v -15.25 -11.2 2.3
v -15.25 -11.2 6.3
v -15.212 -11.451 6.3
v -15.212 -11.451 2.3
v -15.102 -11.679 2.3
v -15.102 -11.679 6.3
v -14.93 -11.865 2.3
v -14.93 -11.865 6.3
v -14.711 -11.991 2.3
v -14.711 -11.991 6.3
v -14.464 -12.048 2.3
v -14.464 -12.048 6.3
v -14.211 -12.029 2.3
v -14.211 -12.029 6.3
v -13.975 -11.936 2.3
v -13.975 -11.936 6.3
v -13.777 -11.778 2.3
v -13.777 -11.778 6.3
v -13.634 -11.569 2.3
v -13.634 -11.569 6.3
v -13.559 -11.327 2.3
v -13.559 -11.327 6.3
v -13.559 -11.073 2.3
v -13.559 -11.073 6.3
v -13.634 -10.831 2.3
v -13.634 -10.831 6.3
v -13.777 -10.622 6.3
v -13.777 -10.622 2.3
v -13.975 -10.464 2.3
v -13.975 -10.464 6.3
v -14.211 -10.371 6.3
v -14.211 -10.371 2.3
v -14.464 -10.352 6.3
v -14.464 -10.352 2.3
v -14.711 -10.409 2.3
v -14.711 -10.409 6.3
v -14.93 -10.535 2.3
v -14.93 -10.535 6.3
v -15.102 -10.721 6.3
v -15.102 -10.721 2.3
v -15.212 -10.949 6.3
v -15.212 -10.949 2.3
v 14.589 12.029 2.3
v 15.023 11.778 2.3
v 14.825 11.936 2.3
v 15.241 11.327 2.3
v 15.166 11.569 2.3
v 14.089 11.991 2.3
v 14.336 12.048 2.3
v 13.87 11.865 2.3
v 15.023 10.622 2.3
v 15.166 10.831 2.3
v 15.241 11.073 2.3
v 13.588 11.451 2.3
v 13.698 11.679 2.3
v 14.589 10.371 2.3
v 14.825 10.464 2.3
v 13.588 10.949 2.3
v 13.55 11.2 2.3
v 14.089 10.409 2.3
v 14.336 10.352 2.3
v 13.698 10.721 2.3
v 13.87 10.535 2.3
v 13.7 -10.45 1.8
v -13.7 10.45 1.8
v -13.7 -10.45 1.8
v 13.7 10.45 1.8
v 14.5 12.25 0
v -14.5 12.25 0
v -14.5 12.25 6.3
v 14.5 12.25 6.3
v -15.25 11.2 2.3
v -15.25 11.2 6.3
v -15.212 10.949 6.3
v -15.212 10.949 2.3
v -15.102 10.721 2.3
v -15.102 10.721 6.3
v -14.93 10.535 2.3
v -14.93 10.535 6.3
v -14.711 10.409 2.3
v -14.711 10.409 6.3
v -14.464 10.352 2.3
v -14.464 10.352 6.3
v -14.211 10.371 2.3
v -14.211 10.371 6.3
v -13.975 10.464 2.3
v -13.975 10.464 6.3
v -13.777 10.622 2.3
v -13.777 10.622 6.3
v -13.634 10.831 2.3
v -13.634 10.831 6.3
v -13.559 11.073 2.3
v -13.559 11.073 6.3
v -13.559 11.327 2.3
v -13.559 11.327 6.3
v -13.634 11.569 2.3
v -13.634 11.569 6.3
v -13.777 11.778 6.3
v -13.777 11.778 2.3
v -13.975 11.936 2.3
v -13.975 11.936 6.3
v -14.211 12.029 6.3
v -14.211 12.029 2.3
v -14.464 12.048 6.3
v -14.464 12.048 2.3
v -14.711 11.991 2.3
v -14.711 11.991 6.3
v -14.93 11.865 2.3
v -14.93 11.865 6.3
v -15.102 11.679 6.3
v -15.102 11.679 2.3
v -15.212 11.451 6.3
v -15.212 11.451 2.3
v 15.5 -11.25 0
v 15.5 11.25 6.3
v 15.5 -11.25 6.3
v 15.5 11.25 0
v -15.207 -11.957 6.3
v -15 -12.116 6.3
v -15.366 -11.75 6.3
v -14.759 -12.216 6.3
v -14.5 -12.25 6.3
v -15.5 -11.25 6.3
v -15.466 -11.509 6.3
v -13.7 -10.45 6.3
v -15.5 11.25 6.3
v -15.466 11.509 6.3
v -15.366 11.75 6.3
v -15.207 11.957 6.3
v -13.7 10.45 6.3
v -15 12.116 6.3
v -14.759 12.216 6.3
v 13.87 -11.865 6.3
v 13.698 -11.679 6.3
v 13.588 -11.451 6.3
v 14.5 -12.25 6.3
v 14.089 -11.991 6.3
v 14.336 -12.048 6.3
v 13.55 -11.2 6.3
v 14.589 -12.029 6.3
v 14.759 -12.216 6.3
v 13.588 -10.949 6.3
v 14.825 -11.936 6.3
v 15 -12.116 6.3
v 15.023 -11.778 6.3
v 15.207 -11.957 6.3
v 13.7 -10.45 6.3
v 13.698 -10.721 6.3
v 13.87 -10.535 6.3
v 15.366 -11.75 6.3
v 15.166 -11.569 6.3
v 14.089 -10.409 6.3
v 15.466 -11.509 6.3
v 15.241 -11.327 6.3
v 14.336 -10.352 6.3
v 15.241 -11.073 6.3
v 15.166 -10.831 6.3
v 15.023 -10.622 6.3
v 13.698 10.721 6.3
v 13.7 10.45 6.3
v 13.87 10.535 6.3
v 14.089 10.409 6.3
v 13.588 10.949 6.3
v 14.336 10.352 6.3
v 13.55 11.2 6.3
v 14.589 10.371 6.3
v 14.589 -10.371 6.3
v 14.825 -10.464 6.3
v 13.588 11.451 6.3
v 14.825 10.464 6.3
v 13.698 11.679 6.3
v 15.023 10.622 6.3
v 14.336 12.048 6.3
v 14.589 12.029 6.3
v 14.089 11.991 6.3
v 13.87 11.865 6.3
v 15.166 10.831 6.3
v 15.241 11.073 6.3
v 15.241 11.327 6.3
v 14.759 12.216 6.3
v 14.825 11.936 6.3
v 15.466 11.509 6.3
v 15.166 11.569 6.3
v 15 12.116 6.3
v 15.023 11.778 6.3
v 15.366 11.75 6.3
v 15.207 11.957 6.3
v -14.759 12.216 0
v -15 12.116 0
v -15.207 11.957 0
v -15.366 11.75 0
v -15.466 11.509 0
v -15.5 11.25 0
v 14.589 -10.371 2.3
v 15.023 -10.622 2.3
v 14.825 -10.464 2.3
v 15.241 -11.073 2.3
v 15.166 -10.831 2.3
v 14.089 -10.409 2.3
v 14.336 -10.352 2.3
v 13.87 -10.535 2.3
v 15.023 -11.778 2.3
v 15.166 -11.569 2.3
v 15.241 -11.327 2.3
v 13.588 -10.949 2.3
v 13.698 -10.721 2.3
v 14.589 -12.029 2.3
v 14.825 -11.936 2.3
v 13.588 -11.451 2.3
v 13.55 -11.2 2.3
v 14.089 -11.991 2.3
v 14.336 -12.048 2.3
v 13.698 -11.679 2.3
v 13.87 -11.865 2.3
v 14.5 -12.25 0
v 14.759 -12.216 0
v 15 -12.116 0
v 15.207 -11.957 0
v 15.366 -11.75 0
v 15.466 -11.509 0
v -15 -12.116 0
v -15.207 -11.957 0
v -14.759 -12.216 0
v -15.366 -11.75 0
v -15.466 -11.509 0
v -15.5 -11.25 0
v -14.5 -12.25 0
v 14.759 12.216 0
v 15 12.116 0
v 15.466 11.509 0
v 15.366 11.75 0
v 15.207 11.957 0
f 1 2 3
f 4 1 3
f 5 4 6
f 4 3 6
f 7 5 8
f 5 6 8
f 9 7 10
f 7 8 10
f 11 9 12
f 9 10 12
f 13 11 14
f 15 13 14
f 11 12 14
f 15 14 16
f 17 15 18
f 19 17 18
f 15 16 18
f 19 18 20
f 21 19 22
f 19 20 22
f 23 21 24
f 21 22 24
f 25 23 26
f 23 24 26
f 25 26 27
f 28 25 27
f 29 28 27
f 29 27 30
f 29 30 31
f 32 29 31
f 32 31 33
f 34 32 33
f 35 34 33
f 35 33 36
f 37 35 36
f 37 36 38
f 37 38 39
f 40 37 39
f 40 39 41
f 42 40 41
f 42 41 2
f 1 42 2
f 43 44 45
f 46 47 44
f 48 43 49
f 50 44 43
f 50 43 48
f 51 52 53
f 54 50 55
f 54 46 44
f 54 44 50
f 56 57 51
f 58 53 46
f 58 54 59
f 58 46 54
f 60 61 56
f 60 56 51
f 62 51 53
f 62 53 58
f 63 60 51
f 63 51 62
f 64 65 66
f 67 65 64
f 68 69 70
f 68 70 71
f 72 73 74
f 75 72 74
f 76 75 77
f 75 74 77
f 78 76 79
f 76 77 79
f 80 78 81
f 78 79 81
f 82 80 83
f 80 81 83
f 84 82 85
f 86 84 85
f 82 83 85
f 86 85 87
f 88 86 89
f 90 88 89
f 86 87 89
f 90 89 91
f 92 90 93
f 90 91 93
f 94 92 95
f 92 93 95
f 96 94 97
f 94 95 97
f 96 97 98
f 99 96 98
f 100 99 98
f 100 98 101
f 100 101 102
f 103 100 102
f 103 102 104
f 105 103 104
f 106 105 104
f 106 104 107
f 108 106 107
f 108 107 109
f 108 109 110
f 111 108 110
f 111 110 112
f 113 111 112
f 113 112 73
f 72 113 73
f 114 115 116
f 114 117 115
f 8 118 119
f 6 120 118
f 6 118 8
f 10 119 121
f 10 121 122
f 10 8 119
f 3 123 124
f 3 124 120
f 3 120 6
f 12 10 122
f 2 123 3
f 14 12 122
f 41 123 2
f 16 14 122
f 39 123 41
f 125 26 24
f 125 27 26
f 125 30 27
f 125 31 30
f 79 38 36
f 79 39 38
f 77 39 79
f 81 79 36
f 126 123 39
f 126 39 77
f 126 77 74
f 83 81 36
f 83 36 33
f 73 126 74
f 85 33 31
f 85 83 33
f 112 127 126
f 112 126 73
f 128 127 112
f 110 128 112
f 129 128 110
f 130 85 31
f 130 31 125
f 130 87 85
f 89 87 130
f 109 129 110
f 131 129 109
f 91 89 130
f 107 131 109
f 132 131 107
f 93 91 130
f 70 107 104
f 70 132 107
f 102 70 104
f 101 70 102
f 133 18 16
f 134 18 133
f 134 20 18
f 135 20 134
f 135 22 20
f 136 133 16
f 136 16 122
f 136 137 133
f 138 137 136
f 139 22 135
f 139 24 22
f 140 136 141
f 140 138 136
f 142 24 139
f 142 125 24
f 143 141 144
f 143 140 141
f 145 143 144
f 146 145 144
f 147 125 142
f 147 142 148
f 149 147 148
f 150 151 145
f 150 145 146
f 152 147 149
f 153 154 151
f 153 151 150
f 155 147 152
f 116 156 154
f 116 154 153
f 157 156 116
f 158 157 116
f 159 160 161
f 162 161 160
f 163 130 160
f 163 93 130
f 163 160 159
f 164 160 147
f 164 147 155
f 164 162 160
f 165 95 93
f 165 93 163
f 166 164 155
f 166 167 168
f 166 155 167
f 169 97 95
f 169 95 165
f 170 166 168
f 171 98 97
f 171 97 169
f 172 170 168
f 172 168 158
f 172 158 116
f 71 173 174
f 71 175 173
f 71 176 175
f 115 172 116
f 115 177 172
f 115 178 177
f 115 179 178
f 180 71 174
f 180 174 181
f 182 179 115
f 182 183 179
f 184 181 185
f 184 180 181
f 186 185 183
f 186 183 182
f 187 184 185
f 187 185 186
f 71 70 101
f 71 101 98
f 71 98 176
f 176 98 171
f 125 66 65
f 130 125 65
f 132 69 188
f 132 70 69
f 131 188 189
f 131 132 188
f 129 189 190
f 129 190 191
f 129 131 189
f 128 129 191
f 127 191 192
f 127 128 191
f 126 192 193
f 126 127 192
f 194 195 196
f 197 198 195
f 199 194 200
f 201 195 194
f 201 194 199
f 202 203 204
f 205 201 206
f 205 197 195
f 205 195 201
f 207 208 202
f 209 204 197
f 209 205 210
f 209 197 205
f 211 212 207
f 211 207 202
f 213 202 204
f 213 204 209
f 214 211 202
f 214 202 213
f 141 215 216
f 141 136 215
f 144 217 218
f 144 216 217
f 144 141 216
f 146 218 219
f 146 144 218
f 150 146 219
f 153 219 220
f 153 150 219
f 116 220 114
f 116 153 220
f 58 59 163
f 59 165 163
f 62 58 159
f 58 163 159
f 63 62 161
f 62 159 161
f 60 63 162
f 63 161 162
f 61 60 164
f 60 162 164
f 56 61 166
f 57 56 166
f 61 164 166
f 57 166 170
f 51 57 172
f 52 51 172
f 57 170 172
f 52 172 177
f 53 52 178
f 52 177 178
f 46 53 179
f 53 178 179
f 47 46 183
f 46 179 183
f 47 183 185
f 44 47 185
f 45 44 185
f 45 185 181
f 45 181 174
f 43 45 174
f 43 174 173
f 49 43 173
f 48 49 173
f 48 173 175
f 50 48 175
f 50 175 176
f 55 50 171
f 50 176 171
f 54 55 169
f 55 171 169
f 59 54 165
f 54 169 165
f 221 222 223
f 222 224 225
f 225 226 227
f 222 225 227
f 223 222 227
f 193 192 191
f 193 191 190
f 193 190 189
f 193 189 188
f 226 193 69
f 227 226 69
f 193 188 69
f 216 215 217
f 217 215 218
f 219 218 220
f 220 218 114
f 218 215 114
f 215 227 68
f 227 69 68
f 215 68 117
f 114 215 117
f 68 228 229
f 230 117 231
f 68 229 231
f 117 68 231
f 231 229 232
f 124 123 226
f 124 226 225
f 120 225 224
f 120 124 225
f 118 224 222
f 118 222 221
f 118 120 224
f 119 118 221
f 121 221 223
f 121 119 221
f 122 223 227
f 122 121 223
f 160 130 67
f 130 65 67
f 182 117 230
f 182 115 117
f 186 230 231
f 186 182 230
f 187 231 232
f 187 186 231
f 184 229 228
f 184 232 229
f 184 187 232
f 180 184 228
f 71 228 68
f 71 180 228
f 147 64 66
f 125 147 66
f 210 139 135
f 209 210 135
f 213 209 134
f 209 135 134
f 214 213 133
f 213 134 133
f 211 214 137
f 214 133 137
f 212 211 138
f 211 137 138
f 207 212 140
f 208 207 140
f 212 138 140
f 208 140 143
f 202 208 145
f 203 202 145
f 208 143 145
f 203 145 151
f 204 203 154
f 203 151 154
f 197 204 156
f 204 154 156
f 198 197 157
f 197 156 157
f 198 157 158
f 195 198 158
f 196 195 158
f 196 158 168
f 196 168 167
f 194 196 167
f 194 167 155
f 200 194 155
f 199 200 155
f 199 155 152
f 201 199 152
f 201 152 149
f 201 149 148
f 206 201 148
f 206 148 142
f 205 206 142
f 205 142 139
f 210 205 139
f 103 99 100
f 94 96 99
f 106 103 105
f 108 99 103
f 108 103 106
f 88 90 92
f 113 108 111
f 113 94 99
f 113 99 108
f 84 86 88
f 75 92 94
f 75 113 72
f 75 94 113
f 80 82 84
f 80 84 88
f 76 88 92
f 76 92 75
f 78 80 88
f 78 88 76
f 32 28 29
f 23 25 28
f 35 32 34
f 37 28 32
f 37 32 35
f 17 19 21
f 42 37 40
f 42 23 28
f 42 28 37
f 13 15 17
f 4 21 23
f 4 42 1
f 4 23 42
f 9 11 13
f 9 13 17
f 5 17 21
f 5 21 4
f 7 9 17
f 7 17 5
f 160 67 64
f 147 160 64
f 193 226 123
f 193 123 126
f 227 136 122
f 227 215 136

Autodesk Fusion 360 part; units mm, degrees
sketch "Sketch1" plane through (0, 0, 0) normal (0, 0, 1) x (1, 0, 0) in component "part 1"
  line L0 (-15.5, 12.25) -> (15.5, 12.25)
  line L1 (15.5, 12.25) -> (15.5, -12.25)
  line L2 (15.5, -12.25) -> (-15.5, -12.25)
  line L3 (-15.5, -12.25) -> (-15.5, 12.25)
  line L4 (-15.5, 12.25) -> (15.5, -12.25) construction
  line L5 (15.5, 12.25) -> (-15.5, -12.25) construction
  dimension "d1" = 31
  dimension "d2" = 24.5
extrude "Extrude1" add sketch "Sketch1" along normal blind 6.3 in component "part 1"
sketch "Sketch2" plane through (0, 0, 6.3) normal (0, 0, 1) x (-1, 0, 0) in component "part 1"
  line L0 (15.5, 12.25) -> (-15.5, 12.25)
  line L1 (-15.5, 12.25) -> (-15.5, -12.25)
  line L2 (-15.5, -12.25) -> (15.5, -12.25)
  line L3 (15.5, -12.25) -> (15.5, 12.25)
shell "Shell1" thickness 1.8 removed faces 1 at (-5.1667, 4.0833, 6.3) in component "part 1"
sketch "Sketch3" plane through (0, 0, 6.3) normal (0, 0, 1) x (-1, 0, 0) in component "part 1"
  circle A0 centre (14.4, -11.2) radius 0.85
  line L0 (0, 0) -> (0, -3.5)
  line L1 (0, 0) -> (3.5, 0)
  circle A1 centre (-14.4, -11.2) radius 0.85
  circle A2 centre (-14.4, 11.2) radius 0.85
  circle A3 centre (14.4, 11.2) radius 0.85
  dimension "d8" = 1.7
  dimension "d9" = 11.2
  dimension "d10" = 14.4
extrude "Extrude2" cut sketch "Sketch3" against normal blind 4 in component "part 1"
fillet "Fillet1" radius 1 1 edges at (15.5, -12.25, 3.15) in component "part 1"
fillet "Fillet1" radius 1 1 edges at (15.5, 12.25, 3.15) in component "part 1"
fillet "Fillet1" radius 1 1 edges at (-15.5, 12.25, 3.15) in component "part 1"
fillet "Fillet1" radius 1 1 edges at (-15.5, -12.25, 3.15) in component "part 1"
component "part 1" placed x (1, 0, 0) y (0, 1, 0) z (0, 0, 1) at (0, 0, 0)
